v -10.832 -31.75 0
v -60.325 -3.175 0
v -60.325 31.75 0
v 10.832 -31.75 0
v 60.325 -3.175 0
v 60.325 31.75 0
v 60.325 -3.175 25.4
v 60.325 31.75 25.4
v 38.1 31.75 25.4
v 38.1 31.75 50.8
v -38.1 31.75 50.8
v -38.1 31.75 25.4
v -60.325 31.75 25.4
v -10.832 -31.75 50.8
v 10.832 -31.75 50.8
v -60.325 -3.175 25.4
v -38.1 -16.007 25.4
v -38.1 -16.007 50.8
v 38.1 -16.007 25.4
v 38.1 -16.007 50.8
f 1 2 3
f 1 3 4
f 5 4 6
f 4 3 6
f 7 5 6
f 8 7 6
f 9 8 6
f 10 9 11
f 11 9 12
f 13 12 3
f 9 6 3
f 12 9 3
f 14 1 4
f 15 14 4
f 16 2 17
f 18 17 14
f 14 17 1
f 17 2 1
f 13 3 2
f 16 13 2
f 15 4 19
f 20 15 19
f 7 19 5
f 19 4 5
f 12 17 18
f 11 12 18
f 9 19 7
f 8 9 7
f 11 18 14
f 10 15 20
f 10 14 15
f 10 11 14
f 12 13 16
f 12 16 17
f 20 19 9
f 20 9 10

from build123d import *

# Parameters (mm, degrees)
F1_DEPTH = 50.8
F2_W     = 22.225
F2_H     = 25.4
F3_DEPTH = 44.704
F4_W     = 22.225
F4_H     = 25.4
F5_DEPTH = 37.592


with BuildPart() as f1:
    # F0 (on Top) → F1 (new body)
    with BuildSketch(Plane.XY):
        Polygon((60.325, 31.75), (-60.325, 31.75), (-60.325, -3.175), (-10.831648, -31.75), (10.831648, -31.75), (60.325, -3.175), align=None)
    extrude(amount=F1_DEPTH)

    # F2 (on Front) → F3 (cut, symmetric)
    with BuildSketch(Plane.XZ):
        with Locations((-49.2125, 38.1)):
            Rectangle(F2_W, F2_H)
    extrude(amount=F3_DEPTH, both=True, mode=Mode.SUBTRACT)

    # F4 (on Front) → F5 (cut, symmetric)
    with BuildSketch(Plane.XZ):
        with Locations((49.2125, 38.1)):
            Rectangle(F4_W, F4_H)
    extrude(amount=F5_DEPTH, both=True, mode=Mode.SUBTRACT)


solid = f1.part
